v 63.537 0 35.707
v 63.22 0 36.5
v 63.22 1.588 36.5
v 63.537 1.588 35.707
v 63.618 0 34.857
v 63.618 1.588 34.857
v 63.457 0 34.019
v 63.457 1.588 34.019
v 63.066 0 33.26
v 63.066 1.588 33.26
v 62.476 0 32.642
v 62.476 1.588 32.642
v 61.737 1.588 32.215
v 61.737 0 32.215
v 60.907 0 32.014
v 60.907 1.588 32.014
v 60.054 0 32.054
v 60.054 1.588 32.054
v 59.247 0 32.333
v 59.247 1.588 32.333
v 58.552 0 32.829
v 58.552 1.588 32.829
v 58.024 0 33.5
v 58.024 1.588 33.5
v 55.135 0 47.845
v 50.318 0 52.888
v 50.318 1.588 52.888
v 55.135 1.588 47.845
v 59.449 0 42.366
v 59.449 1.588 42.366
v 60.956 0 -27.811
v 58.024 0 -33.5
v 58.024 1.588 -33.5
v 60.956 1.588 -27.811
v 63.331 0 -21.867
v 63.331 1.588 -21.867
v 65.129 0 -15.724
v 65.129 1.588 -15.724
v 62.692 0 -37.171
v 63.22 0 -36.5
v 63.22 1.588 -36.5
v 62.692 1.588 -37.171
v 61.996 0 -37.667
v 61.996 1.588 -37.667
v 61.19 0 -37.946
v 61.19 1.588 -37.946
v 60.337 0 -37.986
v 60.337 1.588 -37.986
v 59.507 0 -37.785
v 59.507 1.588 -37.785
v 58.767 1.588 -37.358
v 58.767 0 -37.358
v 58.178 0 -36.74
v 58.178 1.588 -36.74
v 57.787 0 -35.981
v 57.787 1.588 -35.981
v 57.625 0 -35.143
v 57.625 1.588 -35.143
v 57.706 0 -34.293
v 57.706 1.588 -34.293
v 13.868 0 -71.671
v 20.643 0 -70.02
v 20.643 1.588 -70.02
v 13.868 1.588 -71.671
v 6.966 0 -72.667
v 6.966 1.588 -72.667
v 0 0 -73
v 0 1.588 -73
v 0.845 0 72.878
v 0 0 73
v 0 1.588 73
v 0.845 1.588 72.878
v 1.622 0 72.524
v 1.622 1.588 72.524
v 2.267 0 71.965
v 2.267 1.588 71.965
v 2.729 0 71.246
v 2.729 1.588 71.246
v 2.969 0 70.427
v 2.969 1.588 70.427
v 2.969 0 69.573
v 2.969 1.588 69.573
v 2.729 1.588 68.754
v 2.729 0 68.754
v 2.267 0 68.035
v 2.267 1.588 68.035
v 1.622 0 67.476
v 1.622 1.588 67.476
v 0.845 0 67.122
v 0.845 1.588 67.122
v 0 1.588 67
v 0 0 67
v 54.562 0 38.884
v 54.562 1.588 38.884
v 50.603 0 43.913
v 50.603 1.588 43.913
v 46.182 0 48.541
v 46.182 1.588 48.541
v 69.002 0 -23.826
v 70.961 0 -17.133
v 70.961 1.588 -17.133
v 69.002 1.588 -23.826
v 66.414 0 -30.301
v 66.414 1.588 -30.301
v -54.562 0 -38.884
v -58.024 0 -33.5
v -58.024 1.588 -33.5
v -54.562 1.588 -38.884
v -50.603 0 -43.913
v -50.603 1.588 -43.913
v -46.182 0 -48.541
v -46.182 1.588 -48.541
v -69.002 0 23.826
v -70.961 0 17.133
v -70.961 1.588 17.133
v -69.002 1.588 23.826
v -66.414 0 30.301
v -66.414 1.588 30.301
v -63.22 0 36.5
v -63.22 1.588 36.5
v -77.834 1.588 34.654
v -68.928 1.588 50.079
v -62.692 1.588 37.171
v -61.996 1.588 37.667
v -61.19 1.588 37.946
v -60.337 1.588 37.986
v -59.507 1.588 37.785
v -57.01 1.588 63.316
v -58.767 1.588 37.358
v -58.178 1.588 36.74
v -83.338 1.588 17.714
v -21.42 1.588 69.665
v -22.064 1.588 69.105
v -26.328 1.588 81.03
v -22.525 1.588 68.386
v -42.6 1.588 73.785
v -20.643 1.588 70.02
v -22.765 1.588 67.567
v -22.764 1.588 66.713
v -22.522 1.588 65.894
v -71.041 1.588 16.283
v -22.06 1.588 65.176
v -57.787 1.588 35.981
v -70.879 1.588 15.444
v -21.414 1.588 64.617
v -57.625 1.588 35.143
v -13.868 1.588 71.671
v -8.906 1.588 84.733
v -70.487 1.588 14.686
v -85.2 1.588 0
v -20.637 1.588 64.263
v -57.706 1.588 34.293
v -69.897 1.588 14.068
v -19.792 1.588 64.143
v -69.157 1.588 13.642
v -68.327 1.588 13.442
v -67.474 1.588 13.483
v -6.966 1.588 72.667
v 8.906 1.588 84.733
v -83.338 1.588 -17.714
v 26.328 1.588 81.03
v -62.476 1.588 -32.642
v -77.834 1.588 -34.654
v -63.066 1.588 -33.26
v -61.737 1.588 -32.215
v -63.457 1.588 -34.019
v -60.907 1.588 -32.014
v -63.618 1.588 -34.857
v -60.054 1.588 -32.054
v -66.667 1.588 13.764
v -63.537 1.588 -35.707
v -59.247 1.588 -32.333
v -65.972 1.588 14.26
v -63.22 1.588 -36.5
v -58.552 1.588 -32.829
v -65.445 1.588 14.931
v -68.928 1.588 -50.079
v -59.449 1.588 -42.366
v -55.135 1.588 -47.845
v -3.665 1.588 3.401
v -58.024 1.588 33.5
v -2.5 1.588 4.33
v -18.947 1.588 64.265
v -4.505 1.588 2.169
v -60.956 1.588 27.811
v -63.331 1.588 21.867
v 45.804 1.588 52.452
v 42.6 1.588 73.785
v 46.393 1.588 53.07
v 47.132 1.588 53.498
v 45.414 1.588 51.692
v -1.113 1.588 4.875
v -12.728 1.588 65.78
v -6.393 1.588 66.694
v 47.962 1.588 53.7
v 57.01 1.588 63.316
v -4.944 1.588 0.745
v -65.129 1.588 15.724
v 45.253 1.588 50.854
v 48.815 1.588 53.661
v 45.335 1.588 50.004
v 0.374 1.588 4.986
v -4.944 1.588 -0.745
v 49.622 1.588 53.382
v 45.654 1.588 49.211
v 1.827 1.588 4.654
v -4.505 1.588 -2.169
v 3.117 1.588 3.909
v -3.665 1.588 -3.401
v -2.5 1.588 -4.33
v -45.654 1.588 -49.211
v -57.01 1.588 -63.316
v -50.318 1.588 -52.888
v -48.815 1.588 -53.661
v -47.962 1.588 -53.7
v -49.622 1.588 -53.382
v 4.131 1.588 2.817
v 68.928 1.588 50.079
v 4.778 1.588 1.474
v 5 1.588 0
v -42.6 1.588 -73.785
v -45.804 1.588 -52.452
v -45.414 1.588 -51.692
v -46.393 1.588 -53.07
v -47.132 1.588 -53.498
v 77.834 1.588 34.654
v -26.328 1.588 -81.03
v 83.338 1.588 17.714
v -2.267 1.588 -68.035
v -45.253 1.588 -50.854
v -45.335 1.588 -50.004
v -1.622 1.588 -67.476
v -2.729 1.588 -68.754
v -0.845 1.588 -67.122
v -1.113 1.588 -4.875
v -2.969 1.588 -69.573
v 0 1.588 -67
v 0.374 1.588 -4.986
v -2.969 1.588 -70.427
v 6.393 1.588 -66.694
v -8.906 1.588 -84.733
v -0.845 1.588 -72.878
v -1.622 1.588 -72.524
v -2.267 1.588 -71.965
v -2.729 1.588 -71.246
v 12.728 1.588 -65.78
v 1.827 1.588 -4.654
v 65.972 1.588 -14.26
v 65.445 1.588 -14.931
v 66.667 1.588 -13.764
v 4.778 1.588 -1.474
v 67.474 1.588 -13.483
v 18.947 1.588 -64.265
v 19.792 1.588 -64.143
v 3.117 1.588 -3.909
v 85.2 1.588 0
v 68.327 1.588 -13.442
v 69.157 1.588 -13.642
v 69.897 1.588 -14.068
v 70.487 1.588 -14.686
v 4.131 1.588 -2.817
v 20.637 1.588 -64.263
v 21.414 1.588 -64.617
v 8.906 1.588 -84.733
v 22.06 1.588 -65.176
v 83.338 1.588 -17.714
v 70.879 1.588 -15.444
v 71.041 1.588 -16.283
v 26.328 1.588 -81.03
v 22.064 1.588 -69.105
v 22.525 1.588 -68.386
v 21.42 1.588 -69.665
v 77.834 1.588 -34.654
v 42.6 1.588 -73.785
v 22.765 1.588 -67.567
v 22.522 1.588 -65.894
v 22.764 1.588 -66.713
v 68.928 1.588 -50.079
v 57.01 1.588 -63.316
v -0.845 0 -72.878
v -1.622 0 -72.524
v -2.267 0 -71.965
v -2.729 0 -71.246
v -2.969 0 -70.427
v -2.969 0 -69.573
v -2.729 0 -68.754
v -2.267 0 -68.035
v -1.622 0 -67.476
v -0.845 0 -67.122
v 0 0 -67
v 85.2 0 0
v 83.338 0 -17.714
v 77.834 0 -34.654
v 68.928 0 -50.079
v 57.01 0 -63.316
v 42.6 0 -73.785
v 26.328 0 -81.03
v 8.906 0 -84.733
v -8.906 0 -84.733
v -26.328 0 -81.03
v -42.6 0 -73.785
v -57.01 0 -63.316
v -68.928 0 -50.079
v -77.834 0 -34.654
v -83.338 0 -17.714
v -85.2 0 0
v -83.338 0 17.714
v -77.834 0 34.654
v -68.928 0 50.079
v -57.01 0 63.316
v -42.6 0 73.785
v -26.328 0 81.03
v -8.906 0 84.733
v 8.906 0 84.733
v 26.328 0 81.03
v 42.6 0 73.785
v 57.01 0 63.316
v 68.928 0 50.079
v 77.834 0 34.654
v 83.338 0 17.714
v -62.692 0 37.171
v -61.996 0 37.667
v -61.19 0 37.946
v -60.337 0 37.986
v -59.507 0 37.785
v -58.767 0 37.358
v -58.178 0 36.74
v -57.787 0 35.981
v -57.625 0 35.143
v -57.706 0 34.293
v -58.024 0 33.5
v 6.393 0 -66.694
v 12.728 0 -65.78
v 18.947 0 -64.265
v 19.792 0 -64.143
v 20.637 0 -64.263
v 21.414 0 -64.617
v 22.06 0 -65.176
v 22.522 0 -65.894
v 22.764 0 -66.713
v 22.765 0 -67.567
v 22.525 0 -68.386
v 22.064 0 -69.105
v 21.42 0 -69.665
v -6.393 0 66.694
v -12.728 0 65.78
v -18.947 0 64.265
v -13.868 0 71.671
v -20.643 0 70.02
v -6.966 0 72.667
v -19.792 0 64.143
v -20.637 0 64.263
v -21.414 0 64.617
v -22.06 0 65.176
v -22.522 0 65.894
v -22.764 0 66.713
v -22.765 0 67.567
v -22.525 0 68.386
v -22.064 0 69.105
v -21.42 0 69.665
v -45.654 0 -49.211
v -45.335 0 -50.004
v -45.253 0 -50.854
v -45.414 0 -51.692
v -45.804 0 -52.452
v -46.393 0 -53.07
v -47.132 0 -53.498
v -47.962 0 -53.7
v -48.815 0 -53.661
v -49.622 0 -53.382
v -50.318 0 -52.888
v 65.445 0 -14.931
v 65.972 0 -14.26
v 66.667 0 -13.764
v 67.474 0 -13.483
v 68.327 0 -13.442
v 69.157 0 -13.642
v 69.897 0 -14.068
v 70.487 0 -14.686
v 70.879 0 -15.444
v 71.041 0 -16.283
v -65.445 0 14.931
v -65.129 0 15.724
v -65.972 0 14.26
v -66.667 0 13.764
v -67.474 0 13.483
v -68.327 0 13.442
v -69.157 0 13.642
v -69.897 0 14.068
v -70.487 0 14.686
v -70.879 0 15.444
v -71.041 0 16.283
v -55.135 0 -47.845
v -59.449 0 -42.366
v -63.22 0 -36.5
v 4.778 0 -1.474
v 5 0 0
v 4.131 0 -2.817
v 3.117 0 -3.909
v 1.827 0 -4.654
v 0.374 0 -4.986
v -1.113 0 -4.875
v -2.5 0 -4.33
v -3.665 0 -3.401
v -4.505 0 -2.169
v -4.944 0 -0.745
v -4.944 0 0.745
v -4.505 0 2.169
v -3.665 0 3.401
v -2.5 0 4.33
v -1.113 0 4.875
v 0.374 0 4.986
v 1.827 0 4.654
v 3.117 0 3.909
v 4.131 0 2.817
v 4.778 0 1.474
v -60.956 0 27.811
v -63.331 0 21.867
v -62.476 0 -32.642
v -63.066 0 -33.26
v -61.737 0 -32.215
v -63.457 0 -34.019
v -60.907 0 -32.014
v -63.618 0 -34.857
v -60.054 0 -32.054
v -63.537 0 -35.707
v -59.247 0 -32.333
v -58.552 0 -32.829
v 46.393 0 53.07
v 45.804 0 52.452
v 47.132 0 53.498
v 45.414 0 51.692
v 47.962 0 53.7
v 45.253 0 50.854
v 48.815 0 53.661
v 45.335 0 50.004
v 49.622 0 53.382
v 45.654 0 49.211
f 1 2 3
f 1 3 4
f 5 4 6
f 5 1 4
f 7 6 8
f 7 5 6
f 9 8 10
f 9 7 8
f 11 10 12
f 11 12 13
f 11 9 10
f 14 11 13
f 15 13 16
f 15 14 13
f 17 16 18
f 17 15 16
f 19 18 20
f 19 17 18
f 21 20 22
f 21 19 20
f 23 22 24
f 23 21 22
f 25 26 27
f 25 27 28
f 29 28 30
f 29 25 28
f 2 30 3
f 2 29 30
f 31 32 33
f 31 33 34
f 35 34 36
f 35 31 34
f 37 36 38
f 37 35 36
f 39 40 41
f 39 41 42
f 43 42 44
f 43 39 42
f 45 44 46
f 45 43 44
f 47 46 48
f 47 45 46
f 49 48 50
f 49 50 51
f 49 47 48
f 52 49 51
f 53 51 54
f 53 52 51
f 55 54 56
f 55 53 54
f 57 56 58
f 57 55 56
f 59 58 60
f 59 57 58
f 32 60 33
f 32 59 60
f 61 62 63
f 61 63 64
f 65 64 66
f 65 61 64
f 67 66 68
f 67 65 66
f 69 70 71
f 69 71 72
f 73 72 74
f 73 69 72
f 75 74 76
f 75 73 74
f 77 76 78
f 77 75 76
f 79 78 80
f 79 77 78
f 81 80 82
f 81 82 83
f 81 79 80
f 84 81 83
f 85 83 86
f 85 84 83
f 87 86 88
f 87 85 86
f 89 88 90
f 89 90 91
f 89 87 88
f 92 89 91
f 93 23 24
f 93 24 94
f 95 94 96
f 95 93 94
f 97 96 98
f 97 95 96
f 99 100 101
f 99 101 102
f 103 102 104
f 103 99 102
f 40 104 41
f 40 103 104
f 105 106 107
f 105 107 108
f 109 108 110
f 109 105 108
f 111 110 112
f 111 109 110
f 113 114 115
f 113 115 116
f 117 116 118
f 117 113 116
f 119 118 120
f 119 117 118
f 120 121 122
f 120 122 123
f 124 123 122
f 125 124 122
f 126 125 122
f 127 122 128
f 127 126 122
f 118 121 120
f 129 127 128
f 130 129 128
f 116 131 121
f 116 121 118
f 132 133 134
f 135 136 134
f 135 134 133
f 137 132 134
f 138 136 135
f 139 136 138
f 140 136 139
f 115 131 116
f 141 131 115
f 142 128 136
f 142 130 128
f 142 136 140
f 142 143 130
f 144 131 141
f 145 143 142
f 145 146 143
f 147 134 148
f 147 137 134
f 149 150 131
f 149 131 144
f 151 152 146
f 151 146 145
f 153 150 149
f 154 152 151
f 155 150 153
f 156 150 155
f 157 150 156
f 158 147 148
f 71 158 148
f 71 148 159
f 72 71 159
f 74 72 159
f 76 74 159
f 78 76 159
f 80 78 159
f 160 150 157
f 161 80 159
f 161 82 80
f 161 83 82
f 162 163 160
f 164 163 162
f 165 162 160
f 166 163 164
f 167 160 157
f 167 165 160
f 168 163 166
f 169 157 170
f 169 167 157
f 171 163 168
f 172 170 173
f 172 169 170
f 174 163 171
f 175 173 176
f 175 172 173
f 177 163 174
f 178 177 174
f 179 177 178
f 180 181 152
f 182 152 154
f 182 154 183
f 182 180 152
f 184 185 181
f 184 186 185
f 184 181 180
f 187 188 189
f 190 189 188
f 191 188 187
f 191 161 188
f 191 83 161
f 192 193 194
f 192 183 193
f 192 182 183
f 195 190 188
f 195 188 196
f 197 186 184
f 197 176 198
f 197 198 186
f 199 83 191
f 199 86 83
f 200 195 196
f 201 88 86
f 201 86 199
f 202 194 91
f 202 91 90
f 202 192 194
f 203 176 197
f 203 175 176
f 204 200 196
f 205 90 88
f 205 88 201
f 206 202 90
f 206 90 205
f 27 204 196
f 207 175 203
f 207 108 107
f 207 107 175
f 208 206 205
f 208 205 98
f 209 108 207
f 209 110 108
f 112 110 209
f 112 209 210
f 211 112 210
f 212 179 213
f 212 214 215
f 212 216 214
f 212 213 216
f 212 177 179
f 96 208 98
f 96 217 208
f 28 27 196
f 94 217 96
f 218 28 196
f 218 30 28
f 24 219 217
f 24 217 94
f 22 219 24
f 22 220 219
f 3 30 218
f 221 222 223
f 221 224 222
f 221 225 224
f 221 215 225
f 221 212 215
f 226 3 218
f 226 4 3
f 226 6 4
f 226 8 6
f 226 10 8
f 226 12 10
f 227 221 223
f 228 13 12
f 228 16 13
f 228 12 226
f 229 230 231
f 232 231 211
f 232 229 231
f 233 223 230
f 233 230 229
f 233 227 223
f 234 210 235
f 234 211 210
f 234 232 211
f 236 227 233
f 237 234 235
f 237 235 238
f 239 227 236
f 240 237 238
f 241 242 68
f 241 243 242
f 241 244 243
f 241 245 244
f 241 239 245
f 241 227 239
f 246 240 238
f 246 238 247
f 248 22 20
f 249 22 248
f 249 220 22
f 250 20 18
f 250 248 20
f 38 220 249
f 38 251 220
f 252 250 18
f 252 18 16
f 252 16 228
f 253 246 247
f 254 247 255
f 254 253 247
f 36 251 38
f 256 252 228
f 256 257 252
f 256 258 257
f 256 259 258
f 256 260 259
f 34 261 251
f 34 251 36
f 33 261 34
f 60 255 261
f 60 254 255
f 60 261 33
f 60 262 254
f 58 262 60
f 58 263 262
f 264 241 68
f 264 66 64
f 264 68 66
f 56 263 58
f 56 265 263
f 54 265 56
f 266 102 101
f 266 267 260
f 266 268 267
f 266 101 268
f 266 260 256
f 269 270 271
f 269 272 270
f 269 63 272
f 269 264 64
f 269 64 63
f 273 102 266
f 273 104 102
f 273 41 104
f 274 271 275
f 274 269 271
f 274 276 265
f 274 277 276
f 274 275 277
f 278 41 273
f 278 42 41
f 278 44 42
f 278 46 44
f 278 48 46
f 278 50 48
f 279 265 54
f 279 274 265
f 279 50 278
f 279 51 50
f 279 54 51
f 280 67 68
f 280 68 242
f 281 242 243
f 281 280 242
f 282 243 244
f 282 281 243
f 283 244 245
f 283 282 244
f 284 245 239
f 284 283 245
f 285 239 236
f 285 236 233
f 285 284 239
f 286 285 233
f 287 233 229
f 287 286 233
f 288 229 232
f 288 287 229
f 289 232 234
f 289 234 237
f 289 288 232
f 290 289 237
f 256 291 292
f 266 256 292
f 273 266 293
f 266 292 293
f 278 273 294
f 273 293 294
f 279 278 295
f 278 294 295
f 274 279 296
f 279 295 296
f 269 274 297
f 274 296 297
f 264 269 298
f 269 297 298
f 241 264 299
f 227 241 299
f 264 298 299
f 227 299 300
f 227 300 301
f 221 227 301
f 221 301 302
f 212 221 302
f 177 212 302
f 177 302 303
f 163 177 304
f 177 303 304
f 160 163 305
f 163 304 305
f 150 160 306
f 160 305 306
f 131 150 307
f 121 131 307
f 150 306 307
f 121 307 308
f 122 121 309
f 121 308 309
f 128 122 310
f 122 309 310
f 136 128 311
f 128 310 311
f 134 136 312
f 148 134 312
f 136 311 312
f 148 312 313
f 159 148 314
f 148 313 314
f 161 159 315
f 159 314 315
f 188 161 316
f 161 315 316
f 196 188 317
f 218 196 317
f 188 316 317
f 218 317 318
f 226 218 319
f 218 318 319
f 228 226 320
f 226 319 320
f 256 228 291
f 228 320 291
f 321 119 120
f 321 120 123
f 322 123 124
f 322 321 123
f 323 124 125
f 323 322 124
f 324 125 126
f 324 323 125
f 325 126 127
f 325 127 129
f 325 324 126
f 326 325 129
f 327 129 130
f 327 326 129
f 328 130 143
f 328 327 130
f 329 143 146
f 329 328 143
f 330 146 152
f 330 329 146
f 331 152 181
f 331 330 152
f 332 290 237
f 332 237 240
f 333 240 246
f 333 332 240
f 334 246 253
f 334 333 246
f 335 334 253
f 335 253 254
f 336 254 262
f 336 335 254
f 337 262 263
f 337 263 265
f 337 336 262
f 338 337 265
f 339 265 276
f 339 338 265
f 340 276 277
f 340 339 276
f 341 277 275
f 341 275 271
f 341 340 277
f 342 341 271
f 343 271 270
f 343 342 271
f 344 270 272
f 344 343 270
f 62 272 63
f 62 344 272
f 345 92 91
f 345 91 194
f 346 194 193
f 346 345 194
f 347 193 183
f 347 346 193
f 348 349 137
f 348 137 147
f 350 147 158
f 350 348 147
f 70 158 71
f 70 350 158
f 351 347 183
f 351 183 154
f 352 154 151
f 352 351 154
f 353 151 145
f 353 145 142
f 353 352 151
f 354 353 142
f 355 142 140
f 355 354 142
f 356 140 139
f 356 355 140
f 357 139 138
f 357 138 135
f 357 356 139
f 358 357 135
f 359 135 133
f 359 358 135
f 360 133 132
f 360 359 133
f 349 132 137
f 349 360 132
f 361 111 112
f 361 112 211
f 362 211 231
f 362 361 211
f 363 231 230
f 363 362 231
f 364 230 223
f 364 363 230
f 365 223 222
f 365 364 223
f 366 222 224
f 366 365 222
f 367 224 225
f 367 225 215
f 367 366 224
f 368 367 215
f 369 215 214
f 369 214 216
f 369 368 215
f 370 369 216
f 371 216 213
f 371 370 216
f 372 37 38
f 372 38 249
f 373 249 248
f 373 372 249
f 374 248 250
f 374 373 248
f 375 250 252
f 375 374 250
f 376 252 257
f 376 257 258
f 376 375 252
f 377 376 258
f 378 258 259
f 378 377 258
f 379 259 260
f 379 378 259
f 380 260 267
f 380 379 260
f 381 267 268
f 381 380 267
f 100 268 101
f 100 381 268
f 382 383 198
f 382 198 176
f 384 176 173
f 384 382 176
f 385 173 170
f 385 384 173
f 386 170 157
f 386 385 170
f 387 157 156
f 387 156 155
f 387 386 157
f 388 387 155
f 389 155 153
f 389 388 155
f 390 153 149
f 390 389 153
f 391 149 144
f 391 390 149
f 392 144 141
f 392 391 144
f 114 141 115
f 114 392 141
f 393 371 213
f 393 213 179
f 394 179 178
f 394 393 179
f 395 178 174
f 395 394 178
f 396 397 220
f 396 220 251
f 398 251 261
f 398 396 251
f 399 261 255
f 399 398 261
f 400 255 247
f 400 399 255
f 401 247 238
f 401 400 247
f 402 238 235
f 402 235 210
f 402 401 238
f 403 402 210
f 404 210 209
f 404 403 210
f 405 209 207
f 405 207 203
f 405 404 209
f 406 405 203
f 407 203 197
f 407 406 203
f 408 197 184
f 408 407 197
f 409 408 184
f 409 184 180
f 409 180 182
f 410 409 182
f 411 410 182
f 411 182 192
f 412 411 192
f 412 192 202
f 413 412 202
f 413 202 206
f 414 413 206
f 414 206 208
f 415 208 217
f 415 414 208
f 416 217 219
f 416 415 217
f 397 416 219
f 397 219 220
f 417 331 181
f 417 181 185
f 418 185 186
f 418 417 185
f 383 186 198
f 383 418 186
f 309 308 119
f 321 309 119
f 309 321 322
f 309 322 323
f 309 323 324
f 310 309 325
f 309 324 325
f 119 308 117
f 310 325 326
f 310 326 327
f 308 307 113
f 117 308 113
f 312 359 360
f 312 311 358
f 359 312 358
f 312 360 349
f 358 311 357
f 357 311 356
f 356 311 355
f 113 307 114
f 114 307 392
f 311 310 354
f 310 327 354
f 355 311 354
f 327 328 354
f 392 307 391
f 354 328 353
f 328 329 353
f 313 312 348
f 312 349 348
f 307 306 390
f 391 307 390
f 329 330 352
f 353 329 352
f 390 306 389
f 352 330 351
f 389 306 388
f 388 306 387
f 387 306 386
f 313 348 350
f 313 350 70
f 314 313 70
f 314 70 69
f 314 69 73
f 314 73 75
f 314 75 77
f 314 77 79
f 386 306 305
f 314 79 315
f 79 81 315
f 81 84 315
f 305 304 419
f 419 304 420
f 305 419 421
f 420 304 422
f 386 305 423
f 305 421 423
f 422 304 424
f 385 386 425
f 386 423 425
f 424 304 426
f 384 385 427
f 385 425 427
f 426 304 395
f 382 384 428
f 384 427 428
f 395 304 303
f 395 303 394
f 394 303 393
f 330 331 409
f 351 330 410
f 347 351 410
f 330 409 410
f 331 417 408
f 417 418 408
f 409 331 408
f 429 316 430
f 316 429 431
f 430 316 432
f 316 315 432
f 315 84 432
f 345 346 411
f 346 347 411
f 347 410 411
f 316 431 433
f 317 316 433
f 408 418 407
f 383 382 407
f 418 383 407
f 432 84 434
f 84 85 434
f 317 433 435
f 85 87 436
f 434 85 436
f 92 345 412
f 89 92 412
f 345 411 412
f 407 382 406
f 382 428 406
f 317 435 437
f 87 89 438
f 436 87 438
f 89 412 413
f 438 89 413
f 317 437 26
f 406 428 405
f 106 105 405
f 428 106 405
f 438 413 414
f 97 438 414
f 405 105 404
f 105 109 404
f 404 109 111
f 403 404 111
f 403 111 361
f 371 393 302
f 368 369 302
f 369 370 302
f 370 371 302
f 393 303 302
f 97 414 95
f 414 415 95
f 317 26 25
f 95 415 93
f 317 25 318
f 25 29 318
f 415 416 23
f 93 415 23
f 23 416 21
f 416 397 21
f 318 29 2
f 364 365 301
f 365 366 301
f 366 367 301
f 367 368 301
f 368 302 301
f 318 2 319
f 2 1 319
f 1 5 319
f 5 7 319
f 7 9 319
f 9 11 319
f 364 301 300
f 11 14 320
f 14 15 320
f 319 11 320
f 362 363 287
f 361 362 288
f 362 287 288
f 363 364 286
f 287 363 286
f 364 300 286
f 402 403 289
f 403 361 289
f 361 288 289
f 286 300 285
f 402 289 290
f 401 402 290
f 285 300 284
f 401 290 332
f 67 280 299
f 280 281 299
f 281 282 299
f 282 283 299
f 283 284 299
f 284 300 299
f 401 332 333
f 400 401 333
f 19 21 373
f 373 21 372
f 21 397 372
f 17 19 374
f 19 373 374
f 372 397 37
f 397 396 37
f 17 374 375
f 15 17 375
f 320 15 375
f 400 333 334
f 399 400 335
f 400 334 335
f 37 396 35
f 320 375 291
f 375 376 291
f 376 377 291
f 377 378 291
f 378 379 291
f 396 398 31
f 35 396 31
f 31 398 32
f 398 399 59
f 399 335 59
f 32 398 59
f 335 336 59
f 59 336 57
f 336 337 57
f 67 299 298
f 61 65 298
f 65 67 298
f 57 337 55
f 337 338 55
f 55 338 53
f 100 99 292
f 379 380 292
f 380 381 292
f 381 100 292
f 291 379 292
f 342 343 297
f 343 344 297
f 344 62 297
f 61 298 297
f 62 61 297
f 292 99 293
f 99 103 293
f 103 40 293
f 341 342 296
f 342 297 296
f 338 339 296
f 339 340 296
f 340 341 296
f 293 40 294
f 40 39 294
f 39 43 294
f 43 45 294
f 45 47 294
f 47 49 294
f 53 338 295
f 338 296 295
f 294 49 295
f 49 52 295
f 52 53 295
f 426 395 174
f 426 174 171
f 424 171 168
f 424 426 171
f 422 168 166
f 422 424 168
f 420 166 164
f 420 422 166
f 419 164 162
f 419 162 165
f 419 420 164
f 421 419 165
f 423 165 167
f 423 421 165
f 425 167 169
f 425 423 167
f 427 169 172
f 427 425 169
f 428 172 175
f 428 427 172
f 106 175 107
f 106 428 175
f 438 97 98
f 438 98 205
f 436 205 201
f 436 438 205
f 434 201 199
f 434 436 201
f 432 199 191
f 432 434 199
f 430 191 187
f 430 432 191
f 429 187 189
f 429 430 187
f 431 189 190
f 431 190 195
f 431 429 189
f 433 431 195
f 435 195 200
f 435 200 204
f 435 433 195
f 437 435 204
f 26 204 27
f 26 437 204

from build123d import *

# Parameters (mm, degrees)
SKETCH1_R           = 85.2
SKETCH1_R_2         = 5
BOSS_EXTRUDE1_DEPTH = 1.5875


with BuildPart() as part:
    # Sketch1 → Boss-Extrude1 (new body)
    with BuildSketch(Plane(origin=(0, 0, 0), x_dir=(1, 0, 0), z_dir=(0, 1, 0))):
        Circle(SKETCH1_R)
        Circle(SKETCH1_R_2, mode=Mode.SUBTRACT)
        with BuildLine():
            ThreePointArc((70.961061147, 17.132653061), (67.785714286, 27.094223347), (63.219854476, 36.5))
            ThreePointArc((63.219854476, 36.5), (59.121778265, 37.598076211), (58.023702054, 33.5))
            ThreePointArc((58.023702054, 33.5), (62.214285714, 24.86730088), (65.128645162, 15.724489796))
            ThreePointArc((65.128645162, 15.724489796), (68.748934787, 13.512363436), (70.961061147, 17.132653061))
        make_face(mode=Mode.SUBTRACT)
        with BuildLine():
            ThreePointArc((20.643217788, 70.020408163), (10.428571429, 72.251262259), (0, 73))
            ThreePointArc((0, 73), (-3, 70), (0, 67))
            ThreePointArc((0, 67), (9.571428571, 66.312802347), (18.946514956, 64.265306122))
            ThreePointArc((18.946514956, 64.265306122), (22.672417393, 66.294505727), (20.643217788, 70.020408163))
        make_face(mode=Mode.SUBTRACT)
        with BuildLine():
            ThreePointArc((50.317843359, -52.887755102), (57.357142857, -45.157038912), (63.219854476, -36.5))
            ThreePointArc((63.219854476, -36.5), (62.121778265, -32.401923789), (58.023702054, -33.5))
            ThreePointArc((58.023702054, -33.5), (52.642857143, -41.445501467), (46.182130206, -48.540816327))
            ThreePointArc((46.182130206, -48.540816327), (46.076517395, -52.782142291), (50.317843359, -52.887755102))
        make_face(mode=Mode.SUBTRACT)
        with BuildLine():
            ThreePointArc((-20.643217788, -70.020408163), (-10.428571429, -72.251262259), (0, -73))
            ThreePointArc((0, -73), (3, -70), (0, -67))
            ThreePointArc((0, -67), (-9.571428571, -66.312802347), (-18.946514956, -64.265306122))
            ThreePointArc((-18.946514956, -64.265306122), (-22.672417393, -66.294505727), (-20.643217788, -70.020408163))
        make_face(mode=Mode.SUBTRACT)
        with BuildLine():
            ThreePointArc((-70.961061147, -17.132653061), (-67.785714286, -27.094223347), (-63.219854476, -36.5))
            ThreePointArc((-63.219854476, -36.5), (-59.121778265, -37.598076211), (-58.023702054, -33.5))
            ThreePointArc((-58.023702054, -33.5), (-62.214285714, -24.86730088), (-65.128645162, -15.724489796))
            ThreePointArc((-65.128645162, -15.724489796), (-68.748934787, -13.512363436), (-70.961061147, -17.132653061))
        make_face(mode=Mode.SUBTRACT)
        with BuildLine():
            ThreePointArc((-50.317843359, 52.887755102), (-57.357142857, 45.157038912), (-63.219854476, 36.5))
            ThreePointArc((-63.219854476, 36.5), (-62.121778265, 32.401923789), (-58.023702054, 33.5))
            ThreePointArc((-58.023702054, 33.5), (-52.642857143, 41.445501467), (-46.182130206, 48.540816327))
            ThreePointArc((-46.182130206, 48.540816327), (-46.076517395, 52.782142291), (-50.317843359, 52.887755102))
        make_face(mode=Mode.SUBTRACT)
    extrude(amount=BOSS_EXTRUDE1_DEPTH)


solid = part.part
